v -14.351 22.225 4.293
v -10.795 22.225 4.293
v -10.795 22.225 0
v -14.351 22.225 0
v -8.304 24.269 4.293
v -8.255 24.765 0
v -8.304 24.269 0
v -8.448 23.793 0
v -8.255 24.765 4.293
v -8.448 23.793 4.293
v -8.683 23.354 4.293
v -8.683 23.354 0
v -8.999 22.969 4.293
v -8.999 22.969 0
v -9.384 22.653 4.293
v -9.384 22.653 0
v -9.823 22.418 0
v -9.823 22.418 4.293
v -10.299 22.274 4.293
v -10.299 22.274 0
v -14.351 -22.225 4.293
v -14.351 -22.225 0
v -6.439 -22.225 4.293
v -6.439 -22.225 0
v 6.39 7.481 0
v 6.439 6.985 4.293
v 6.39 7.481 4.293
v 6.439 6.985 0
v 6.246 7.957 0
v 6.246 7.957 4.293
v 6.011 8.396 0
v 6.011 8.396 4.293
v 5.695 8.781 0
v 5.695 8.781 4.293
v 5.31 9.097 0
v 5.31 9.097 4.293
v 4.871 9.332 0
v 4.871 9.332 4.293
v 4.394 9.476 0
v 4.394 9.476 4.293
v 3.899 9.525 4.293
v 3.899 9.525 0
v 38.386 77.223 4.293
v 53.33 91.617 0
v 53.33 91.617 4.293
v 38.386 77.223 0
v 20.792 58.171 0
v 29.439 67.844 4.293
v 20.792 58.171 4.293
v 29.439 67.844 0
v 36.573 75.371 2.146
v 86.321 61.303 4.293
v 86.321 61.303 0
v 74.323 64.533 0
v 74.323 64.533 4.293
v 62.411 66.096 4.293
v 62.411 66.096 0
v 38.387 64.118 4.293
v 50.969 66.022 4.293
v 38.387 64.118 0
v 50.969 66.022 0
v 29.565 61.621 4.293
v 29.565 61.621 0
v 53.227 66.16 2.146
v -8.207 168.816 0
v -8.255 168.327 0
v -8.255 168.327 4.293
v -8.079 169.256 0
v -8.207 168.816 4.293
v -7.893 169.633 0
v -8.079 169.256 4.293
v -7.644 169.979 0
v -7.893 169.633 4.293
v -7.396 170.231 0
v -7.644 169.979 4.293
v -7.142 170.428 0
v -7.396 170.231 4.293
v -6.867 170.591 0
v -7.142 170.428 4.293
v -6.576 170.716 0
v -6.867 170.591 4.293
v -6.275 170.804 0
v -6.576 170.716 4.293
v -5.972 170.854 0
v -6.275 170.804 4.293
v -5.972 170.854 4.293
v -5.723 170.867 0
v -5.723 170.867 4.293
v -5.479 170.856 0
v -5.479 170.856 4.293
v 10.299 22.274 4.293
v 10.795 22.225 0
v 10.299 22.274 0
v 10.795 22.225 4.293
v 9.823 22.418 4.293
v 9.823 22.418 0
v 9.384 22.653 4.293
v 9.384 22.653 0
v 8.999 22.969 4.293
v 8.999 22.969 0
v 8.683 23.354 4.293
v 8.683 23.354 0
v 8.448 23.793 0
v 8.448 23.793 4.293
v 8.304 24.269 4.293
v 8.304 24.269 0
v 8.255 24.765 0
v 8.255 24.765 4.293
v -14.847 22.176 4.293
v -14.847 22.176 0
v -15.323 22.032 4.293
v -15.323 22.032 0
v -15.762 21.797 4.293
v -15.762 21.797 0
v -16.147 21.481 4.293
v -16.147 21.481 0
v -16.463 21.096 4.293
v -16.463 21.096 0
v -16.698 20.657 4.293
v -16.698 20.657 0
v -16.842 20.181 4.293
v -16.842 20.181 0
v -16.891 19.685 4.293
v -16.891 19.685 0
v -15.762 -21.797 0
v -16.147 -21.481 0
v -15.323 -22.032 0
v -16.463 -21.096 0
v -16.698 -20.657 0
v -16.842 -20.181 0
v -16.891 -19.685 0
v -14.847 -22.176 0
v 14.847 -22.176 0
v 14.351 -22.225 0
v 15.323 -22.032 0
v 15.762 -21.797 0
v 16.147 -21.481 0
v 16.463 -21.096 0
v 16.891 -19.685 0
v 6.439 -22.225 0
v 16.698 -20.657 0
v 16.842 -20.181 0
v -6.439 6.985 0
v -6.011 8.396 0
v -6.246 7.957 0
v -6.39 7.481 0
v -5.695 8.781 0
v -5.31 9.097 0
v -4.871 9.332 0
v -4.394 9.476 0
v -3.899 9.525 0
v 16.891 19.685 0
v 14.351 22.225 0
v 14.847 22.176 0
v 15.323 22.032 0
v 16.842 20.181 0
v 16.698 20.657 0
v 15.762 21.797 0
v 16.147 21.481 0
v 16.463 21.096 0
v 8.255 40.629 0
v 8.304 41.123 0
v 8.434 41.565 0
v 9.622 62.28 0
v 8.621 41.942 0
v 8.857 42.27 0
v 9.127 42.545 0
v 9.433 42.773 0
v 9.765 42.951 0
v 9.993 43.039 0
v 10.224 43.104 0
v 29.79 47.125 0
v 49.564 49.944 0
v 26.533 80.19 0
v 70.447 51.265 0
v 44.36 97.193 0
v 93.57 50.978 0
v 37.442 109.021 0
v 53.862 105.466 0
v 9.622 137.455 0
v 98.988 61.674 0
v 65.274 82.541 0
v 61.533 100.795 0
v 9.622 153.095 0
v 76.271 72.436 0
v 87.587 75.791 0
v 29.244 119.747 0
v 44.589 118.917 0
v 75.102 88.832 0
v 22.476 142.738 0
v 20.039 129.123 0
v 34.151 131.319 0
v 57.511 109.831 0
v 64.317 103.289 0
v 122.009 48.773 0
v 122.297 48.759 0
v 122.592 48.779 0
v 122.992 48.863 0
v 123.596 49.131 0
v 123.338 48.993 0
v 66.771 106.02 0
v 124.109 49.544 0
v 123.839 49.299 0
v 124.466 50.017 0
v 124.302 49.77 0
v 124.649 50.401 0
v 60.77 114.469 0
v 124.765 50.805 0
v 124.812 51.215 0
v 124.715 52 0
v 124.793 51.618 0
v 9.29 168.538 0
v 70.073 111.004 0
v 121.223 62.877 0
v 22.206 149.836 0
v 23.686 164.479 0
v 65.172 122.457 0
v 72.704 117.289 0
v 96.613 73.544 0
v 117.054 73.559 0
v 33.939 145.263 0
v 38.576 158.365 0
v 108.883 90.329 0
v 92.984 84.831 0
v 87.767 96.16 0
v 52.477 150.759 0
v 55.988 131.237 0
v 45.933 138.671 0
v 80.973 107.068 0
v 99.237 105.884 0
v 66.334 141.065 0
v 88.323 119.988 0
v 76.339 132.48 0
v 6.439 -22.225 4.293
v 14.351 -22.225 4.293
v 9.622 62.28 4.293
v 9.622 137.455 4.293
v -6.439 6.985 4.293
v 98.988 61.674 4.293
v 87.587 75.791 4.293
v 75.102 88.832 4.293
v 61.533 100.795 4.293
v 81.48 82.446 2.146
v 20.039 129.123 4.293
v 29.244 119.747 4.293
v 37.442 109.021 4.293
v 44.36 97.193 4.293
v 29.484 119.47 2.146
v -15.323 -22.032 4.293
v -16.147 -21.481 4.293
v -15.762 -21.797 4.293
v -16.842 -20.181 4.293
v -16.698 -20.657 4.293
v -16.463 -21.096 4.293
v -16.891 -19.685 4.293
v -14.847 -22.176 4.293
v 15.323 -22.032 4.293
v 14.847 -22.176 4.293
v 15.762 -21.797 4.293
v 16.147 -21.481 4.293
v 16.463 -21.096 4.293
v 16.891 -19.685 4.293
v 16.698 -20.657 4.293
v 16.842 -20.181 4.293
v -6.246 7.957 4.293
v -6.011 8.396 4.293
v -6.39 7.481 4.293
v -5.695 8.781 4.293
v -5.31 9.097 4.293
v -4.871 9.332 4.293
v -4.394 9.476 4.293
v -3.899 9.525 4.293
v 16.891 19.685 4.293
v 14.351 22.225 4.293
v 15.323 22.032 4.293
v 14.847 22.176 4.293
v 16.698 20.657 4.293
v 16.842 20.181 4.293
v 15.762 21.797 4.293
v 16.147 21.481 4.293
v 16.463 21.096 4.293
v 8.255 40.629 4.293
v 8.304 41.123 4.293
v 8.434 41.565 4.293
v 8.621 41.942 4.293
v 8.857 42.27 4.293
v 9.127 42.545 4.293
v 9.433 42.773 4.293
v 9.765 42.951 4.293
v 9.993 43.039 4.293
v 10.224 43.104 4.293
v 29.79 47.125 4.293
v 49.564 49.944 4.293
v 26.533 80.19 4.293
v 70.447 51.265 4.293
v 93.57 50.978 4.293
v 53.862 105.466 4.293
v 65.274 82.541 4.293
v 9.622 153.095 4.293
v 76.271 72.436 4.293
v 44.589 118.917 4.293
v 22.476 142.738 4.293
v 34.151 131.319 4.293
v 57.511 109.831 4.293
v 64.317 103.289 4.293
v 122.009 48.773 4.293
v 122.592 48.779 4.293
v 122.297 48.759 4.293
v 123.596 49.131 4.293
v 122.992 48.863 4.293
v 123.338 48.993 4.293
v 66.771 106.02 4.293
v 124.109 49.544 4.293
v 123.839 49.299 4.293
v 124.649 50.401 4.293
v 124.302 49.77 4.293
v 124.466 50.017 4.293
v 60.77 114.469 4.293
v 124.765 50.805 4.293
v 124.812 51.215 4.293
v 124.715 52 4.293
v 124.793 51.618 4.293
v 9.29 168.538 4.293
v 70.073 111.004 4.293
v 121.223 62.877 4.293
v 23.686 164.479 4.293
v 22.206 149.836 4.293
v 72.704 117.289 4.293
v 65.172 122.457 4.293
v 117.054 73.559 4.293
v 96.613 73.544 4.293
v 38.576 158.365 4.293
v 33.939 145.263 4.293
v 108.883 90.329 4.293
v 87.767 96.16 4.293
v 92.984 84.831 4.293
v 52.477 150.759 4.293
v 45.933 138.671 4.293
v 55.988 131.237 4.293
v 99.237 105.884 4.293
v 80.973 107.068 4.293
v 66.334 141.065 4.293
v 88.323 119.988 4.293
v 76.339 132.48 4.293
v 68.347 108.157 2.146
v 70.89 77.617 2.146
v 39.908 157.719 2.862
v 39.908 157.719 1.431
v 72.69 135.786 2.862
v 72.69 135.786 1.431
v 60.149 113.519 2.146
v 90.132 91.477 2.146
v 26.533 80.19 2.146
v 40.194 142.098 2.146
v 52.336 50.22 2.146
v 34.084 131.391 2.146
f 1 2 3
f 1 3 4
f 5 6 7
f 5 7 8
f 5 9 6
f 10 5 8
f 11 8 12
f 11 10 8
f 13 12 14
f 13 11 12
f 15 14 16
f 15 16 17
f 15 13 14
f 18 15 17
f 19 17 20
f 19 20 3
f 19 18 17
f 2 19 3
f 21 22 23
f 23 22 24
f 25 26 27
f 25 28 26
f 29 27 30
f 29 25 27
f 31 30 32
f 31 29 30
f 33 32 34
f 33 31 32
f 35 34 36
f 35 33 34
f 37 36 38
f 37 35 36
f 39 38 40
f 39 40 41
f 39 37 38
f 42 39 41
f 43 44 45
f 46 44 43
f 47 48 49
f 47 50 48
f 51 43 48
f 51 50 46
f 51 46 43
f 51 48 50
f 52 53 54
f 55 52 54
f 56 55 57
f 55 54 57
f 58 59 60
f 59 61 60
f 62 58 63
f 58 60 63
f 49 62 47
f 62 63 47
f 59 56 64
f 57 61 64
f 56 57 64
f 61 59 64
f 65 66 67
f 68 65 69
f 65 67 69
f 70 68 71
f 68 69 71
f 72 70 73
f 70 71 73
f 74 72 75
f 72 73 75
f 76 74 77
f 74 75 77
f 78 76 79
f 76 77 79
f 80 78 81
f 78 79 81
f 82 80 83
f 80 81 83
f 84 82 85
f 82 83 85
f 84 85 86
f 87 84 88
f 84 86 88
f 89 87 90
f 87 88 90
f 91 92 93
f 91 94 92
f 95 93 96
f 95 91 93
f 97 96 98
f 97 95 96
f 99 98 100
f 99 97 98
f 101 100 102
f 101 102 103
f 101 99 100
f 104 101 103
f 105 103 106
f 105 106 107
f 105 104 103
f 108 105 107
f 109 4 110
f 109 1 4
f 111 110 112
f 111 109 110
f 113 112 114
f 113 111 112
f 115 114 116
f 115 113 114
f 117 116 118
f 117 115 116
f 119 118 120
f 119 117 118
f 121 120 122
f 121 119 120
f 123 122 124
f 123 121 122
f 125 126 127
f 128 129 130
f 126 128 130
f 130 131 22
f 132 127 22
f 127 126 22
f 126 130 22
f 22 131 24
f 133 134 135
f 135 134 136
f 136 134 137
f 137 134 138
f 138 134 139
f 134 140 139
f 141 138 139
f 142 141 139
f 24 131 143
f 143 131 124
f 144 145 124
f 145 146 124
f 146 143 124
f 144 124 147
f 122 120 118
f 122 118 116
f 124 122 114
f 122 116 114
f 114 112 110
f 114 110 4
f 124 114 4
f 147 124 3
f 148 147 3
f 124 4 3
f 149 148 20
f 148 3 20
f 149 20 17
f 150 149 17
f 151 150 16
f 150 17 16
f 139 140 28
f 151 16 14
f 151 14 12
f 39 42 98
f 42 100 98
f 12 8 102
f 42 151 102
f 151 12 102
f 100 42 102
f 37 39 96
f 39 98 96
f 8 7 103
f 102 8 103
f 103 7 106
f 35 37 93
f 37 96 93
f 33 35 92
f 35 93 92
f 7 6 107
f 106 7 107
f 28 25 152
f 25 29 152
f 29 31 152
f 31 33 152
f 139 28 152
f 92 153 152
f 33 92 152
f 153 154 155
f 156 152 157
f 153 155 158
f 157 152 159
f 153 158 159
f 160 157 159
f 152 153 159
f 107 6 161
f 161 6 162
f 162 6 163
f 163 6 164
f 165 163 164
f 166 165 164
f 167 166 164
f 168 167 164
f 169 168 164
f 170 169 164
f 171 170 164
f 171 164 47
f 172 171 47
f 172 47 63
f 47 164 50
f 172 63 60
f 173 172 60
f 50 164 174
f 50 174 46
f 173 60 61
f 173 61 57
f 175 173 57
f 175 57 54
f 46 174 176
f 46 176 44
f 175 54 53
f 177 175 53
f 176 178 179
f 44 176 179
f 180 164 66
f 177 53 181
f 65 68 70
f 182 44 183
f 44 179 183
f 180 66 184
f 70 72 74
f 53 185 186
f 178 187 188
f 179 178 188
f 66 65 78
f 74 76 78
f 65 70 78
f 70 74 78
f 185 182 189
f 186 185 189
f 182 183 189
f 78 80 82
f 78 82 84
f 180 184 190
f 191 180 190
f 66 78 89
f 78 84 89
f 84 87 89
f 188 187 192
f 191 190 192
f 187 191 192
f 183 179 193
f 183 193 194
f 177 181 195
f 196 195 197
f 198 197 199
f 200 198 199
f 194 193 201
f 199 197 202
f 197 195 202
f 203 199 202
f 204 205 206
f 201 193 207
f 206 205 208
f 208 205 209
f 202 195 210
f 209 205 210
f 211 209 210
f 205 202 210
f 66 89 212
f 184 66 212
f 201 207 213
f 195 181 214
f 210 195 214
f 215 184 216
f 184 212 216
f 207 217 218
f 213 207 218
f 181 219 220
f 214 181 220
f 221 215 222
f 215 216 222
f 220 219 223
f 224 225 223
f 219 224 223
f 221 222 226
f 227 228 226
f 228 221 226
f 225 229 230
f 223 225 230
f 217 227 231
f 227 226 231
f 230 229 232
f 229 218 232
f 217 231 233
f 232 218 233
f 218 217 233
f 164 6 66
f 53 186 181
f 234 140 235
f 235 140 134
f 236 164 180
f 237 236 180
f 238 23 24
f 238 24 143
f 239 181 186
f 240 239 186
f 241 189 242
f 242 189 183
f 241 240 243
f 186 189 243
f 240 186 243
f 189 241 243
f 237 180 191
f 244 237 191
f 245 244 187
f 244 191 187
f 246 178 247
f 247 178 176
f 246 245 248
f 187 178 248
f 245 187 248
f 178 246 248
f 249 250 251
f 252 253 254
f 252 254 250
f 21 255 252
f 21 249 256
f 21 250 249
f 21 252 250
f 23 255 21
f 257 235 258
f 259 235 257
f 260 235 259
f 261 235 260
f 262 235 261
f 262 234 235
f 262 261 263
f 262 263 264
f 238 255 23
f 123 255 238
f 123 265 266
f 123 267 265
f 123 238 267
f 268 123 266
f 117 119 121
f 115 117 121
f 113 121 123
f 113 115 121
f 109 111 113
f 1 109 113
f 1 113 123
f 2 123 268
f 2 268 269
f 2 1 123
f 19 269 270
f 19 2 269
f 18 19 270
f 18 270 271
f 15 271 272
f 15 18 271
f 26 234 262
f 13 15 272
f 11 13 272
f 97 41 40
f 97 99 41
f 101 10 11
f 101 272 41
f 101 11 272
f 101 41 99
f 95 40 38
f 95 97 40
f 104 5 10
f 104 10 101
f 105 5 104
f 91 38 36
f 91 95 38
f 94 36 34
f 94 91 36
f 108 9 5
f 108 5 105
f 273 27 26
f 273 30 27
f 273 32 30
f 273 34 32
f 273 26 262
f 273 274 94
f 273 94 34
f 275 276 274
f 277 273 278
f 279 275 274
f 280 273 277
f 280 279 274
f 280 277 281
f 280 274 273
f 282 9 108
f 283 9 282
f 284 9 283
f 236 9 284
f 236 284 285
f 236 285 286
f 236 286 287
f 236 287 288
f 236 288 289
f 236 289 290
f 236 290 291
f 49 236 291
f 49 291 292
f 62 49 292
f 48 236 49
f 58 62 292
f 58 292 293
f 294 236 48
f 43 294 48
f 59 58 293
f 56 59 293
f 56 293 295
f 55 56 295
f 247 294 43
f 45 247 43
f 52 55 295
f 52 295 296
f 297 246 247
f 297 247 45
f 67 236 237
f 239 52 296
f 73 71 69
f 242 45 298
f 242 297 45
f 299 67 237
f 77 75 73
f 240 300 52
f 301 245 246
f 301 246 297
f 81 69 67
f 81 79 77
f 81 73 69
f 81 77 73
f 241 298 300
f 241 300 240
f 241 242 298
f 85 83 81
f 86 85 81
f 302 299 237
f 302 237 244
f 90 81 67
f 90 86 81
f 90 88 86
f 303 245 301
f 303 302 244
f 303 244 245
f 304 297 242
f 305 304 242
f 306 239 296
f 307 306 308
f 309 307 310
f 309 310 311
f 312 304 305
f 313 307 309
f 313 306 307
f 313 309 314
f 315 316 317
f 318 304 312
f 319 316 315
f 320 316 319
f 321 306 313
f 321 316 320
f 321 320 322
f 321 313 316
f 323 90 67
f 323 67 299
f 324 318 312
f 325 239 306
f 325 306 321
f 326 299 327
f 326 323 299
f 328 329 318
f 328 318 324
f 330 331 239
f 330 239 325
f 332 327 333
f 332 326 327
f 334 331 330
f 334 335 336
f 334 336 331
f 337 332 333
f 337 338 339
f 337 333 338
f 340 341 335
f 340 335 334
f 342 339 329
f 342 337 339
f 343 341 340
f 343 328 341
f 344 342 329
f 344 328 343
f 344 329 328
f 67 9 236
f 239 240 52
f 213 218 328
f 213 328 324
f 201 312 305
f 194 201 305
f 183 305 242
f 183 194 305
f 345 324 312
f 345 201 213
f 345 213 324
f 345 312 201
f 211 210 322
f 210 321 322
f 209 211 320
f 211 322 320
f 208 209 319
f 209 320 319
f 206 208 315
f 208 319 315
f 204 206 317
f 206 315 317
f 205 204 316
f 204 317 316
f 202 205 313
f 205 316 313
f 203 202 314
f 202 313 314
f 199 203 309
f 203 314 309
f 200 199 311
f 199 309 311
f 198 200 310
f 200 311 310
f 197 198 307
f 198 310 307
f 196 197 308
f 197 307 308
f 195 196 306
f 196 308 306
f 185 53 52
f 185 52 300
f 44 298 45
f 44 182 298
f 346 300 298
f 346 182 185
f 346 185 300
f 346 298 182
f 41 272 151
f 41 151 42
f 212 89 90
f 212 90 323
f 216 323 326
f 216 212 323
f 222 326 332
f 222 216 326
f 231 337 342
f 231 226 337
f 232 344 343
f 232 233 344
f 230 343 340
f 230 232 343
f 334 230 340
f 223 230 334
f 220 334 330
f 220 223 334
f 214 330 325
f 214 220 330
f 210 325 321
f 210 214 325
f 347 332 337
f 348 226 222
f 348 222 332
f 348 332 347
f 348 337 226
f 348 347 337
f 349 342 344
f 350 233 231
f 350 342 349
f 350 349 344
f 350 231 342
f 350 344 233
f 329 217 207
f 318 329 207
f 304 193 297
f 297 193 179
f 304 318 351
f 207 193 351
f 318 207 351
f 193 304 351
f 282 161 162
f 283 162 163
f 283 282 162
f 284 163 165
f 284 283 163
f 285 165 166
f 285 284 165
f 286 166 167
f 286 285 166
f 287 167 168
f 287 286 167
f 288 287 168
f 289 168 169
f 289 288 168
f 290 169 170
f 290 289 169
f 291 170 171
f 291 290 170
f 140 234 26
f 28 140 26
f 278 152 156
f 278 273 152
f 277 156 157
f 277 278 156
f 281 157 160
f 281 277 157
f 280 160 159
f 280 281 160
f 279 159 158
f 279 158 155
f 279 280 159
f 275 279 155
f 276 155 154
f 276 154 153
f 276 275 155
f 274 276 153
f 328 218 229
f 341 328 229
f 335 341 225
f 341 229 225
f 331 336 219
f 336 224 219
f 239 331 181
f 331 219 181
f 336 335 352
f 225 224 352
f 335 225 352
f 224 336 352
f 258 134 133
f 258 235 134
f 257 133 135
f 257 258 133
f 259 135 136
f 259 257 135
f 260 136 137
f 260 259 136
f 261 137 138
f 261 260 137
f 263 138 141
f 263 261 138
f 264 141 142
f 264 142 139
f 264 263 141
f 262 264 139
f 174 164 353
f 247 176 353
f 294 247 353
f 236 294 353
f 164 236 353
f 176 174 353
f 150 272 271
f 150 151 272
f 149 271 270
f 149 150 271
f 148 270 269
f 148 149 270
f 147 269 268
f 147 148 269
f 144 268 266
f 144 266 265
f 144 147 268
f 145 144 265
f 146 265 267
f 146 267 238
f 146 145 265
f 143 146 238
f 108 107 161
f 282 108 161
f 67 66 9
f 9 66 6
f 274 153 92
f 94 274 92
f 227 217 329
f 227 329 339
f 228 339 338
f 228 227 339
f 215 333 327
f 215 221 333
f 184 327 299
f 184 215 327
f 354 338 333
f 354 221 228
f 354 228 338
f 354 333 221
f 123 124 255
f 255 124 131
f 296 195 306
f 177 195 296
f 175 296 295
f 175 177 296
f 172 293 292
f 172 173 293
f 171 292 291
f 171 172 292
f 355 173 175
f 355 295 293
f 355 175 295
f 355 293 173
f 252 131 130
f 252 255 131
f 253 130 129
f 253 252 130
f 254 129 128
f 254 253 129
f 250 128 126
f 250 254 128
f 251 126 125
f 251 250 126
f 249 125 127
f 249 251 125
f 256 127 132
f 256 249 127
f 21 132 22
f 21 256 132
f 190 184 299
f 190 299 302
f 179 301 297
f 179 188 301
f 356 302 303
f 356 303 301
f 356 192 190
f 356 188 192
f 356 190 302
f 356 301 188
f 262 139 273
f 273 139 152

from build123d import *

# Parameters (mm, degrees)
SKETCH1_W           = 16.51
SKETCH1_H           = 22.225
BOSS_EXTRUDE1_DEPTH = 4.2926
FILLET1_R           = 2.54
SKETCH3_W           = 12.8778
SKETCH3_H           = 31.75
CUT_EXTRUDE1_DEPTH  = 4.2926
FILLET2_R           = 2.54
CUT_EXTRUDE2_DEPTH  = 4.2926


with BuildPart() as part:
    # Sketch1 → Boss-Extrude1 (new body)
    with BuildSketch(Plane.XY):
        with BuildLine():
            Line((-8.255, 171.081987477), (-8.255, 146.05))
            Line((-8.255, 146.05), (8.255, 146.05))
            Line((8.255, 146.05), (8.255, 42.644883355))
            add(Edge.make_bspline(
                [(125.716580007, 48.373759919), (101.454363005, 51.05167226), (61.670696801, 53.384876658), (22.758908367, 46.056998678), (8.255, 42.644883355)],
                knots=[0, 0, 0, 0, 0.621556192, 1, 1, 1, 1], degree=3))
            add(Edge.make_bspline(
                [(-8.255, 171.081987477), (8.482506786, 169.920834594), (37.696093446, 161.351973623), (91.678547842, 125.040727361), (116.930099327, 81.490043726), (125.716580007, 48.373759919)],
                knots=[0, 0, 0, 0, 0.260197261, 0.464601463, 1, 1, 1, 1], degree=3))
        make_face()
        Polygon((-8.255, 146.05), (-8.255, 22.225), (8.255, 22.225), (8.255, 42.644883355), (8.255, 146.05), align=None)
        with Locations((0, 11.1125)):
            Rectangle(SKETCH1_W, SKETCH1_H)
        Polygon((-16.891, 22.225), (-16.891, -22.225), (16.891, -22.225), (16.891, 22.225), (8.255, 22.225), (8.255, 0), (-8.255, 0), (-8.255, 22.225), align=None)
    extrude(amount=BOSS_EXTRUDE1_DEPTH)

    # Fillet1
    fillet1_edges = [part.edges().sort_by_distance(p)[0] for p in [
        (16.891, 22.225, 2.1463),
        (16.891, -22.225, 2.1463),
        (-16.891, -22.225, 2.1463),
        (-16.891, 22.225, 2.1463),
        (-8.255, 22.225, 2.1463),
        (8.255, 42.644883355, 2.1463),
        (8.255, 22.225, 2.1463),
    ]]
    fillet(fillet1_edges, radius=FILLET1_R)

    # Sketch3 → Cut-Extrude1 (cut)
    with BuildSketch(Plane.XY.offset(4.2926)):
        with Locations((0, -6.35)):
            Rectangle(SKETCH3_W, SKETCH3_H)
    extrude(amount=-CUT_EXTRUDE1_DEPTH, mode=Mode.SUBTRACT)

    # Fillet2
    fillet2_edges = [part.edges().sort_by_distance(p)[0] for p in [
        (6.4389, 9.525, 2.1463),
        (-6.4389, 9.525, 2.1463),
        (125.716580007, 48.373759919, 2.1463),
        (-8.255, 171.081987477, 2.1463),
    ]]
    fillet(fillet2_edges, radius=FILLET2_R)

    # Sketch4 → Cut-Extrude2 (cut)
    with BuildSketch(Plane(origin=(0, 0, 0), x_dir=(-1, 0, 0), z_dir=(0, 0, -1))):
        with BuildLine():
            Line((-9.622290965, 62.279587003), (-9.622290965, 137.454872526))
            add(Edge.make_bspline(
                [(-9.622290965, 137.454872526), (-31.976257123, 121.615669166), (-44.359940554, 97.193181134)],
                knots=[0, 0, 0, 1, 1, 1], degree=2))
            add(Edge.make_bspline(
                [(-44.359940554, 97.193181134), (-26.073912196, 80.643285354), (-9.622290965, 62.279587003)],
                knots=[0, 0, 0, 1, 1, 1], degree=2))
        make_face()
        with BuildLine():
            add(Edge.make_bspline(
                [(-65.171801242, 122.457122028), (-42.991307033, 146.419627916), (-9.622290965, 153.095219352)],
                knots=[0, 0, 0, 1, 1, 1], degree=2))
            add(Edge.make_bspline(
                [(-9.622290965, 153.095219352), (-36.425668846, 133.501984123), (-53.862303727, 105.466469115)],
                knots=[0, 0, 0, 1, 1, 1], degree=2))
            add(Edge.make_bspline(
                [(-65.171801242, 122.457122028), (-60.781840314, 113.076876159), (-53.862303727, 105.466469115)],
                knots=[0, 0, 0, 1, 1, 1], degree=2))
        make_face()
        with BuildLine():
            add(Edge.make_bspline(
                [(-72.704015401, 117.289439294), (-94.417782838, 93.472755404), (-98.988348102, 61.673623274)],
                knots=[0, 0, 0, 1, 1, 1], degree=2))
            add(Edge.make_bspline(
                [(-98.988348102, 61.673623274), (-82.698421223, 83.657662509), (-61.533499928, 100.794910417)],
                knots=[0, 0, 0, 1, 1, 1], degree=2))
            add(Edge.make_bspline(
                [(-72.704015401, 117.289439294), (-69.576013453, 107.271375671), (-61.533499928, 100.794910417)],
                knots=[0, 0, 0, 1, 1, 1], degree=2))
        make_face()
        with BuildLine():
            add(Edge.make_bspline(
                [(-86.321212925, 61.303058161), (-71.955525072, 78.774376711), (-53.329729843, 91.61675501)],
                knots=[0, 0, 0, 1, 1, 1], degree=2))
            add(Edge.make_bspline(
                [(-53.329729843, 91.61675501), (-36.084210617, 75.847325958), (-20.792276935, 58.171365413)],
                knots=[0, 0, 0, 1, 1, 1], degree=2))
            add(Edge.make_bspline(
                [(-86.321212925, 61.303058161), (-52.898087225, 72.583199638), (-20.792276935, 58.171365413)],
                knots=[0, 0, 0, 1, 1, 1], degree=2))
        make_face()
    extrude(amount=-CUT_EXTRUDE2_DEPTH, mode=Mode.SUBTRACT)


solid = part.part
